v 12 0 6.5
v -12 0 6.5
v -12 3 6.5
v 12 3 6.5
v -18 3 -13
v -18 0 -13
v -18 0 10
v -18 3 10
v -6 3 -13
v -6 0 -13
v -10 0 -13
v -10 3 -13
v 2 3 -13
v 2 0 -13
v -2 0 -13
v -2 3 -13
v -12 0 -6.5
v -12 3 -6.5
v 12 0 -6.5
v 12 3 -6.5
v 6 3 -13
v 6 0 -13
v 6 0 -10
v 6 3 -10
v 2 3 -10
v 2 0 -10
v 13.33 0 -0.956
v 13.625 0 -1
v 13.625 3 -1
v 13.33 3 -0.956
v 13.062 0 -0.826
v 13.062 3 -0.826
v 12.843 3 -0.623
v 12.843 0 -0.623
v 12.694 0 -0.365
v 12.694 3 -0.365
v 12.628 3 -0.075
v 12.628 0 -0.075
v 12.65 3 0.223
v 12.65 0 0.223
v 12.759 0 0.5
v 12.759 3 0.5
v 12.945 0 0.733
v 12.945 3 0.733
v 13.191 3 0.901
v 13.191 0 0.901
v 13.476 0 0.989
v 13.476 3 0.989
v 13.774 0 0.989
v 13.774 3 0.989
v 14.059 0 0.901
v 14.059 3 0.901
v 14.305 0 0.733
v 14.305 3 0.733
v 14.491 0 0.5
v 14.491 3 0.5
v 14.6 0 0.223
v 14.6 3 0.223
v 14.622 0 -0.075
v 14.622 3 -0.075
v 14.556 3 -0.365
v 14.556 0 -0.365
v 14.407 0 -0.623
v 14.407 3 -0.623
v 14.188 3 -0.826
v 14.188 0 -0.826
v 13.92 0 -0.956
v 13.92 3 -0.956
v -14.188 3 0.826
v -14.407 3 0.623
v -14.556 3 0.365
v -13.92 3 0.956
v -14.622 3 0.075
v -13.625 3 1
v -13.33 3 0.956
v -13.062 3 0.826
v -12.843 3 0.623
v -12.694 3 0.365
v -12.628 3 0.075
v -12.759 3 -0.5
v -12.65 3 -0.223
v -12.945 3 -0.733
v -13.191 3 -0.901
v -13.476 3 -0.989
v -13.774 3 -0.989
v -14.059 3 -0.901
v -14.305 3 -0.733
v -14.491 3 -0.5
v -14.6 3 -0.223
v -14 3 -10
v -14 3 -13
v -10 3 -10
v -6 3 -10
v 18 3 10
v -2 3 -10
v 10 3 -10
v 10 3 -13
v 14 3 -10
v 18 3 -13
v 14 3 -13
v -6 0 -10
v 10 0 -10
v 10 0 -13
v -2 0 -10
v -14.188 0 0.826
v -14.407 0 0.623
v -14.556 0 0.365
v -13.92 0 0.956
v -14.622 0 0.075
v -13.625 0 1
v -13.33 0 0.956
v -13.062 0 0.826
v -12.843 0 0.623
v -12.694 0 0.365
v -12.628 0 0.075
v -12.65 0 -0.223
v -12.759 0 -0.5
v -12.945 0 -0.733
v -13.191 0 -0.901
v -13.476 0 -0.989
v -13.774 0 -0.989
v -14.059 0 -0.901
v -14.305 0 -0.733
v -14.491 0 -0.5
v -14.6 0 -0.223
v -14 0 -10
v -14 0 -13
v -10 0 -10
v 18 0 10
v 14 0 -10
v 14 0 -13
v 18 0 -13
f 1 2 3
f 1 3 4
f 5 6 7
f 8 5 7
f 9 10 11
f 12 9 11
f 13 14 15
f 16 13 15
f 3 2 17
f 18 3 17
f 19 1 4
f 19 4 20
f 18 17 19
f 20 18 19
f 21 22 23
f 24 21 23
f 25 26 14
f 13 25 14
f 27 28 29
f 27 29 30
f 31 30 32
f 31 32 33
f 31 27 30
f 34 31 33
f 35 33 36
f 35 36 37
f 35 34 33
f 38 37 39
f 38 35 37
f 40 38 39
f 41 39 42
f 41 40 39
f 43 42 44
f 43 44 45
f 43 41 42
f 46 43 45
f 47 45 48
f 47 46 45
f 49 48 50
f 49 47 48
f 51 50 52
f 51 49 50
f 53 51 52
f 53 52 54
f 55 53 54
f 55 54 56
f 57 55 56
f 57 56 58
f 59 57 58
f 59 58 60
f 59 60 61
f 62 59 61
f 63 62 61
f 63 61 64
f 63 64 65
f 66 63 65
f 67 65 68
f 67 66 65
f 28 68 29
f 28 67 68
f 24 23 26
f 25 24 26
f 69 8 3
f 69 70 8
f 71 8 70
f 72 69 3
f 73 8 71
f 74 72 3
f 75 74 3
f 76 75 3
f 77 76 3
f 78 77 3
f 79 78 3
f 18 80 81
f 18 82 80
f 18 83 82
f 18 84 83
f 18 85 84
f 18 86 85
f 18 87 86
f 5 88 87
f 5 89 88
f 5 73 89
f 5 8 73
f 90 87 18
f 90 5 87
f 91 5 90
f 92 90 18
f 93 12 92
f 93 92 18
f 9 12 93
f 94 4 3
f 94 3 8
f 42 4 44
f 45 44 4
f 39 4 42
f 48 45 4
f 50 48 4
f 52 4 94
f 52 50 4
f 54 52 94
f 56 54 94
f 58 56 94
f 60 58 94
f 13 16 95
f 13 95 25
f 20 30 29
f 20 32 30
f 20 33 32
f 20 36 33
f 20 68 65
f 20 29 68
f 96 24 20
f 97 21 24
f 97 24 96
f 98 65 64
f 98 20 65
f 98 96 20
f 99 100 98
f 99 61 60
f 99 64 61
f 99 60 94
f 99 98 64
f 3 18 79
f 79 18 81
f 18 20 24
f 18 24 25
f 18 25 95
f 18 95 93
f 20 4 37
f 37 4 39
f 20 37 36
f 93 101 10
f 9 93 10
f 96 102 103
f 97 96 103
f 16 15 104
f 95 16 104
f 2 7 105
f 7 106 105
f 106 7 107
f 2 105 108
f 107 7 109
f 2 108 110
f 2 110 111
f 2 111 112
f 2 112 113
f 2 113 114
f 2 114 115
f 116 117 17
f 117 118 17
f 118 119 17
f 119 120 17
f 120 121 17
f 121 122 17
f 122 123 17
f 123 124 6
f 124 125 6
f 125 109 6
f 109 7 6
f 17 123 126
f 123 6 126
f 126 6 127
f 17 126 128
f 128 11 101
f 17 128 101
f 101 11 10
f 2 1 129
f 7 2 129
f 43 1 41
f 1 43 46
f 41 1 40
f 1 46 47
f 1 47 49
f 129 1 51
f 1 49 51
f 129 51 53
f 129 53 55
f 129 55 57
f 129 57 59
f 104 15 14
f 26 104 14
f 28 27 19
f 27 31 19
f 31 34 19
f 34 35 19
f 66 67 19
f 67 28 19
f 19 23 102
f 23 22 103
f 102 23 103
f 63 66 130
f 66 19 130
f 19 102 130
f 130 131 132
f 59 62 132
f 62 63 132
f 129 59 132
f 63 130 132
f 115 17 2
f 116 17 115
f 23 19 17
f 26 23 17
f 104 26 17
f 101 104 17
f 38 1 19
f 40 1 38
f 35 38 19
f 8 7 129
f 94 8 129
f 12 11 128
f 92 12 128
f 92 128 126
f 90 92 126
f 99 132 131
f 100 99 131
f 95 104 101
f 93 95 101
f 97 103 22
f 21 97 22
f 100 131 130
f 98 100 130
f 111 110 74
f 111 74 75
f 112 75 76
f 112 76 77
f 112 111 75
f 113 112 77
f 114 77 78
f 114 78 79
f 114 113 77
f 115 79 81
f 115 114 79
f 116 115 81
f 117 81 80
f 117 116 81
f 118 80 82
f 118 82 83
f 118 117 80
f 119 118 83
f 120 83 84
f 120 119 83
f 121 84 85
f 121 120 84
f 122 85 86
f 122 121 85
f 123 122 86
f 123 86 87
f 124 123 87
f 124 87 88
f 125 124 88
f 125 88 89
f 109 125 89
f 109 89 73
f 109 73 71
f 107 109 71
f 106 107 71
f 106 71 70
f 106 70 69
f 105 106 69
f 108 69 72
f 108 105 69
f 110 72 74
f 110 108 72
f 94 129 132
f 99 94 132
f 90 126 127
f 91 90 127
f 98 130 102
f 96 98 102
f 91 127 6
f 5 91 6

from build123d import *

# Parameters (mm, degrees)
SKETCH1_R           = 1
SKETCH1_W           = 24
SKETCH1_H           = 13
BOSS_EXTRUDE1_DEPTH = 3


with BuildPart() as part:
    # Sketch1 → Boss-Extrude1 (new body)
    with BuildSketch(Plane(origin=(0, 0, 0), x_dir=(1, 0, 0), z_dir=(0, 1, 0))):
        Polygon((-18, -10), (18, -10), (18, 10), (18, 13), (14, 13), (14, 10), (10, 10), (10, 13), (6, 13), (6, 10), (2, 10), (2, 13), (-2, 13), (-2, 10), (-6, 10), (-6, 13), (-10, 13), (-10, 10), (-14, 10), (-14, 13), (-18, 13), (-18, 10), align=None)
        with Locations(Location((-13.625, 0, 0), (0, 0, 270))):
            Circle(SKETCH1_R, mode=Mode.SUBTRACT)
        with Locations(Location((13.625, 0, 0), (0, 0, 90))):
            Circle(SKETCH1_R, mode=Mode.SUBTRACT)
        Rectangle(SKETCH1_W, SKETCH1_H, mode=Mode.SUBTRACT)
    extrude(amount=BOSS_EXTRUDE1_DEPTH)


solid = part.part
